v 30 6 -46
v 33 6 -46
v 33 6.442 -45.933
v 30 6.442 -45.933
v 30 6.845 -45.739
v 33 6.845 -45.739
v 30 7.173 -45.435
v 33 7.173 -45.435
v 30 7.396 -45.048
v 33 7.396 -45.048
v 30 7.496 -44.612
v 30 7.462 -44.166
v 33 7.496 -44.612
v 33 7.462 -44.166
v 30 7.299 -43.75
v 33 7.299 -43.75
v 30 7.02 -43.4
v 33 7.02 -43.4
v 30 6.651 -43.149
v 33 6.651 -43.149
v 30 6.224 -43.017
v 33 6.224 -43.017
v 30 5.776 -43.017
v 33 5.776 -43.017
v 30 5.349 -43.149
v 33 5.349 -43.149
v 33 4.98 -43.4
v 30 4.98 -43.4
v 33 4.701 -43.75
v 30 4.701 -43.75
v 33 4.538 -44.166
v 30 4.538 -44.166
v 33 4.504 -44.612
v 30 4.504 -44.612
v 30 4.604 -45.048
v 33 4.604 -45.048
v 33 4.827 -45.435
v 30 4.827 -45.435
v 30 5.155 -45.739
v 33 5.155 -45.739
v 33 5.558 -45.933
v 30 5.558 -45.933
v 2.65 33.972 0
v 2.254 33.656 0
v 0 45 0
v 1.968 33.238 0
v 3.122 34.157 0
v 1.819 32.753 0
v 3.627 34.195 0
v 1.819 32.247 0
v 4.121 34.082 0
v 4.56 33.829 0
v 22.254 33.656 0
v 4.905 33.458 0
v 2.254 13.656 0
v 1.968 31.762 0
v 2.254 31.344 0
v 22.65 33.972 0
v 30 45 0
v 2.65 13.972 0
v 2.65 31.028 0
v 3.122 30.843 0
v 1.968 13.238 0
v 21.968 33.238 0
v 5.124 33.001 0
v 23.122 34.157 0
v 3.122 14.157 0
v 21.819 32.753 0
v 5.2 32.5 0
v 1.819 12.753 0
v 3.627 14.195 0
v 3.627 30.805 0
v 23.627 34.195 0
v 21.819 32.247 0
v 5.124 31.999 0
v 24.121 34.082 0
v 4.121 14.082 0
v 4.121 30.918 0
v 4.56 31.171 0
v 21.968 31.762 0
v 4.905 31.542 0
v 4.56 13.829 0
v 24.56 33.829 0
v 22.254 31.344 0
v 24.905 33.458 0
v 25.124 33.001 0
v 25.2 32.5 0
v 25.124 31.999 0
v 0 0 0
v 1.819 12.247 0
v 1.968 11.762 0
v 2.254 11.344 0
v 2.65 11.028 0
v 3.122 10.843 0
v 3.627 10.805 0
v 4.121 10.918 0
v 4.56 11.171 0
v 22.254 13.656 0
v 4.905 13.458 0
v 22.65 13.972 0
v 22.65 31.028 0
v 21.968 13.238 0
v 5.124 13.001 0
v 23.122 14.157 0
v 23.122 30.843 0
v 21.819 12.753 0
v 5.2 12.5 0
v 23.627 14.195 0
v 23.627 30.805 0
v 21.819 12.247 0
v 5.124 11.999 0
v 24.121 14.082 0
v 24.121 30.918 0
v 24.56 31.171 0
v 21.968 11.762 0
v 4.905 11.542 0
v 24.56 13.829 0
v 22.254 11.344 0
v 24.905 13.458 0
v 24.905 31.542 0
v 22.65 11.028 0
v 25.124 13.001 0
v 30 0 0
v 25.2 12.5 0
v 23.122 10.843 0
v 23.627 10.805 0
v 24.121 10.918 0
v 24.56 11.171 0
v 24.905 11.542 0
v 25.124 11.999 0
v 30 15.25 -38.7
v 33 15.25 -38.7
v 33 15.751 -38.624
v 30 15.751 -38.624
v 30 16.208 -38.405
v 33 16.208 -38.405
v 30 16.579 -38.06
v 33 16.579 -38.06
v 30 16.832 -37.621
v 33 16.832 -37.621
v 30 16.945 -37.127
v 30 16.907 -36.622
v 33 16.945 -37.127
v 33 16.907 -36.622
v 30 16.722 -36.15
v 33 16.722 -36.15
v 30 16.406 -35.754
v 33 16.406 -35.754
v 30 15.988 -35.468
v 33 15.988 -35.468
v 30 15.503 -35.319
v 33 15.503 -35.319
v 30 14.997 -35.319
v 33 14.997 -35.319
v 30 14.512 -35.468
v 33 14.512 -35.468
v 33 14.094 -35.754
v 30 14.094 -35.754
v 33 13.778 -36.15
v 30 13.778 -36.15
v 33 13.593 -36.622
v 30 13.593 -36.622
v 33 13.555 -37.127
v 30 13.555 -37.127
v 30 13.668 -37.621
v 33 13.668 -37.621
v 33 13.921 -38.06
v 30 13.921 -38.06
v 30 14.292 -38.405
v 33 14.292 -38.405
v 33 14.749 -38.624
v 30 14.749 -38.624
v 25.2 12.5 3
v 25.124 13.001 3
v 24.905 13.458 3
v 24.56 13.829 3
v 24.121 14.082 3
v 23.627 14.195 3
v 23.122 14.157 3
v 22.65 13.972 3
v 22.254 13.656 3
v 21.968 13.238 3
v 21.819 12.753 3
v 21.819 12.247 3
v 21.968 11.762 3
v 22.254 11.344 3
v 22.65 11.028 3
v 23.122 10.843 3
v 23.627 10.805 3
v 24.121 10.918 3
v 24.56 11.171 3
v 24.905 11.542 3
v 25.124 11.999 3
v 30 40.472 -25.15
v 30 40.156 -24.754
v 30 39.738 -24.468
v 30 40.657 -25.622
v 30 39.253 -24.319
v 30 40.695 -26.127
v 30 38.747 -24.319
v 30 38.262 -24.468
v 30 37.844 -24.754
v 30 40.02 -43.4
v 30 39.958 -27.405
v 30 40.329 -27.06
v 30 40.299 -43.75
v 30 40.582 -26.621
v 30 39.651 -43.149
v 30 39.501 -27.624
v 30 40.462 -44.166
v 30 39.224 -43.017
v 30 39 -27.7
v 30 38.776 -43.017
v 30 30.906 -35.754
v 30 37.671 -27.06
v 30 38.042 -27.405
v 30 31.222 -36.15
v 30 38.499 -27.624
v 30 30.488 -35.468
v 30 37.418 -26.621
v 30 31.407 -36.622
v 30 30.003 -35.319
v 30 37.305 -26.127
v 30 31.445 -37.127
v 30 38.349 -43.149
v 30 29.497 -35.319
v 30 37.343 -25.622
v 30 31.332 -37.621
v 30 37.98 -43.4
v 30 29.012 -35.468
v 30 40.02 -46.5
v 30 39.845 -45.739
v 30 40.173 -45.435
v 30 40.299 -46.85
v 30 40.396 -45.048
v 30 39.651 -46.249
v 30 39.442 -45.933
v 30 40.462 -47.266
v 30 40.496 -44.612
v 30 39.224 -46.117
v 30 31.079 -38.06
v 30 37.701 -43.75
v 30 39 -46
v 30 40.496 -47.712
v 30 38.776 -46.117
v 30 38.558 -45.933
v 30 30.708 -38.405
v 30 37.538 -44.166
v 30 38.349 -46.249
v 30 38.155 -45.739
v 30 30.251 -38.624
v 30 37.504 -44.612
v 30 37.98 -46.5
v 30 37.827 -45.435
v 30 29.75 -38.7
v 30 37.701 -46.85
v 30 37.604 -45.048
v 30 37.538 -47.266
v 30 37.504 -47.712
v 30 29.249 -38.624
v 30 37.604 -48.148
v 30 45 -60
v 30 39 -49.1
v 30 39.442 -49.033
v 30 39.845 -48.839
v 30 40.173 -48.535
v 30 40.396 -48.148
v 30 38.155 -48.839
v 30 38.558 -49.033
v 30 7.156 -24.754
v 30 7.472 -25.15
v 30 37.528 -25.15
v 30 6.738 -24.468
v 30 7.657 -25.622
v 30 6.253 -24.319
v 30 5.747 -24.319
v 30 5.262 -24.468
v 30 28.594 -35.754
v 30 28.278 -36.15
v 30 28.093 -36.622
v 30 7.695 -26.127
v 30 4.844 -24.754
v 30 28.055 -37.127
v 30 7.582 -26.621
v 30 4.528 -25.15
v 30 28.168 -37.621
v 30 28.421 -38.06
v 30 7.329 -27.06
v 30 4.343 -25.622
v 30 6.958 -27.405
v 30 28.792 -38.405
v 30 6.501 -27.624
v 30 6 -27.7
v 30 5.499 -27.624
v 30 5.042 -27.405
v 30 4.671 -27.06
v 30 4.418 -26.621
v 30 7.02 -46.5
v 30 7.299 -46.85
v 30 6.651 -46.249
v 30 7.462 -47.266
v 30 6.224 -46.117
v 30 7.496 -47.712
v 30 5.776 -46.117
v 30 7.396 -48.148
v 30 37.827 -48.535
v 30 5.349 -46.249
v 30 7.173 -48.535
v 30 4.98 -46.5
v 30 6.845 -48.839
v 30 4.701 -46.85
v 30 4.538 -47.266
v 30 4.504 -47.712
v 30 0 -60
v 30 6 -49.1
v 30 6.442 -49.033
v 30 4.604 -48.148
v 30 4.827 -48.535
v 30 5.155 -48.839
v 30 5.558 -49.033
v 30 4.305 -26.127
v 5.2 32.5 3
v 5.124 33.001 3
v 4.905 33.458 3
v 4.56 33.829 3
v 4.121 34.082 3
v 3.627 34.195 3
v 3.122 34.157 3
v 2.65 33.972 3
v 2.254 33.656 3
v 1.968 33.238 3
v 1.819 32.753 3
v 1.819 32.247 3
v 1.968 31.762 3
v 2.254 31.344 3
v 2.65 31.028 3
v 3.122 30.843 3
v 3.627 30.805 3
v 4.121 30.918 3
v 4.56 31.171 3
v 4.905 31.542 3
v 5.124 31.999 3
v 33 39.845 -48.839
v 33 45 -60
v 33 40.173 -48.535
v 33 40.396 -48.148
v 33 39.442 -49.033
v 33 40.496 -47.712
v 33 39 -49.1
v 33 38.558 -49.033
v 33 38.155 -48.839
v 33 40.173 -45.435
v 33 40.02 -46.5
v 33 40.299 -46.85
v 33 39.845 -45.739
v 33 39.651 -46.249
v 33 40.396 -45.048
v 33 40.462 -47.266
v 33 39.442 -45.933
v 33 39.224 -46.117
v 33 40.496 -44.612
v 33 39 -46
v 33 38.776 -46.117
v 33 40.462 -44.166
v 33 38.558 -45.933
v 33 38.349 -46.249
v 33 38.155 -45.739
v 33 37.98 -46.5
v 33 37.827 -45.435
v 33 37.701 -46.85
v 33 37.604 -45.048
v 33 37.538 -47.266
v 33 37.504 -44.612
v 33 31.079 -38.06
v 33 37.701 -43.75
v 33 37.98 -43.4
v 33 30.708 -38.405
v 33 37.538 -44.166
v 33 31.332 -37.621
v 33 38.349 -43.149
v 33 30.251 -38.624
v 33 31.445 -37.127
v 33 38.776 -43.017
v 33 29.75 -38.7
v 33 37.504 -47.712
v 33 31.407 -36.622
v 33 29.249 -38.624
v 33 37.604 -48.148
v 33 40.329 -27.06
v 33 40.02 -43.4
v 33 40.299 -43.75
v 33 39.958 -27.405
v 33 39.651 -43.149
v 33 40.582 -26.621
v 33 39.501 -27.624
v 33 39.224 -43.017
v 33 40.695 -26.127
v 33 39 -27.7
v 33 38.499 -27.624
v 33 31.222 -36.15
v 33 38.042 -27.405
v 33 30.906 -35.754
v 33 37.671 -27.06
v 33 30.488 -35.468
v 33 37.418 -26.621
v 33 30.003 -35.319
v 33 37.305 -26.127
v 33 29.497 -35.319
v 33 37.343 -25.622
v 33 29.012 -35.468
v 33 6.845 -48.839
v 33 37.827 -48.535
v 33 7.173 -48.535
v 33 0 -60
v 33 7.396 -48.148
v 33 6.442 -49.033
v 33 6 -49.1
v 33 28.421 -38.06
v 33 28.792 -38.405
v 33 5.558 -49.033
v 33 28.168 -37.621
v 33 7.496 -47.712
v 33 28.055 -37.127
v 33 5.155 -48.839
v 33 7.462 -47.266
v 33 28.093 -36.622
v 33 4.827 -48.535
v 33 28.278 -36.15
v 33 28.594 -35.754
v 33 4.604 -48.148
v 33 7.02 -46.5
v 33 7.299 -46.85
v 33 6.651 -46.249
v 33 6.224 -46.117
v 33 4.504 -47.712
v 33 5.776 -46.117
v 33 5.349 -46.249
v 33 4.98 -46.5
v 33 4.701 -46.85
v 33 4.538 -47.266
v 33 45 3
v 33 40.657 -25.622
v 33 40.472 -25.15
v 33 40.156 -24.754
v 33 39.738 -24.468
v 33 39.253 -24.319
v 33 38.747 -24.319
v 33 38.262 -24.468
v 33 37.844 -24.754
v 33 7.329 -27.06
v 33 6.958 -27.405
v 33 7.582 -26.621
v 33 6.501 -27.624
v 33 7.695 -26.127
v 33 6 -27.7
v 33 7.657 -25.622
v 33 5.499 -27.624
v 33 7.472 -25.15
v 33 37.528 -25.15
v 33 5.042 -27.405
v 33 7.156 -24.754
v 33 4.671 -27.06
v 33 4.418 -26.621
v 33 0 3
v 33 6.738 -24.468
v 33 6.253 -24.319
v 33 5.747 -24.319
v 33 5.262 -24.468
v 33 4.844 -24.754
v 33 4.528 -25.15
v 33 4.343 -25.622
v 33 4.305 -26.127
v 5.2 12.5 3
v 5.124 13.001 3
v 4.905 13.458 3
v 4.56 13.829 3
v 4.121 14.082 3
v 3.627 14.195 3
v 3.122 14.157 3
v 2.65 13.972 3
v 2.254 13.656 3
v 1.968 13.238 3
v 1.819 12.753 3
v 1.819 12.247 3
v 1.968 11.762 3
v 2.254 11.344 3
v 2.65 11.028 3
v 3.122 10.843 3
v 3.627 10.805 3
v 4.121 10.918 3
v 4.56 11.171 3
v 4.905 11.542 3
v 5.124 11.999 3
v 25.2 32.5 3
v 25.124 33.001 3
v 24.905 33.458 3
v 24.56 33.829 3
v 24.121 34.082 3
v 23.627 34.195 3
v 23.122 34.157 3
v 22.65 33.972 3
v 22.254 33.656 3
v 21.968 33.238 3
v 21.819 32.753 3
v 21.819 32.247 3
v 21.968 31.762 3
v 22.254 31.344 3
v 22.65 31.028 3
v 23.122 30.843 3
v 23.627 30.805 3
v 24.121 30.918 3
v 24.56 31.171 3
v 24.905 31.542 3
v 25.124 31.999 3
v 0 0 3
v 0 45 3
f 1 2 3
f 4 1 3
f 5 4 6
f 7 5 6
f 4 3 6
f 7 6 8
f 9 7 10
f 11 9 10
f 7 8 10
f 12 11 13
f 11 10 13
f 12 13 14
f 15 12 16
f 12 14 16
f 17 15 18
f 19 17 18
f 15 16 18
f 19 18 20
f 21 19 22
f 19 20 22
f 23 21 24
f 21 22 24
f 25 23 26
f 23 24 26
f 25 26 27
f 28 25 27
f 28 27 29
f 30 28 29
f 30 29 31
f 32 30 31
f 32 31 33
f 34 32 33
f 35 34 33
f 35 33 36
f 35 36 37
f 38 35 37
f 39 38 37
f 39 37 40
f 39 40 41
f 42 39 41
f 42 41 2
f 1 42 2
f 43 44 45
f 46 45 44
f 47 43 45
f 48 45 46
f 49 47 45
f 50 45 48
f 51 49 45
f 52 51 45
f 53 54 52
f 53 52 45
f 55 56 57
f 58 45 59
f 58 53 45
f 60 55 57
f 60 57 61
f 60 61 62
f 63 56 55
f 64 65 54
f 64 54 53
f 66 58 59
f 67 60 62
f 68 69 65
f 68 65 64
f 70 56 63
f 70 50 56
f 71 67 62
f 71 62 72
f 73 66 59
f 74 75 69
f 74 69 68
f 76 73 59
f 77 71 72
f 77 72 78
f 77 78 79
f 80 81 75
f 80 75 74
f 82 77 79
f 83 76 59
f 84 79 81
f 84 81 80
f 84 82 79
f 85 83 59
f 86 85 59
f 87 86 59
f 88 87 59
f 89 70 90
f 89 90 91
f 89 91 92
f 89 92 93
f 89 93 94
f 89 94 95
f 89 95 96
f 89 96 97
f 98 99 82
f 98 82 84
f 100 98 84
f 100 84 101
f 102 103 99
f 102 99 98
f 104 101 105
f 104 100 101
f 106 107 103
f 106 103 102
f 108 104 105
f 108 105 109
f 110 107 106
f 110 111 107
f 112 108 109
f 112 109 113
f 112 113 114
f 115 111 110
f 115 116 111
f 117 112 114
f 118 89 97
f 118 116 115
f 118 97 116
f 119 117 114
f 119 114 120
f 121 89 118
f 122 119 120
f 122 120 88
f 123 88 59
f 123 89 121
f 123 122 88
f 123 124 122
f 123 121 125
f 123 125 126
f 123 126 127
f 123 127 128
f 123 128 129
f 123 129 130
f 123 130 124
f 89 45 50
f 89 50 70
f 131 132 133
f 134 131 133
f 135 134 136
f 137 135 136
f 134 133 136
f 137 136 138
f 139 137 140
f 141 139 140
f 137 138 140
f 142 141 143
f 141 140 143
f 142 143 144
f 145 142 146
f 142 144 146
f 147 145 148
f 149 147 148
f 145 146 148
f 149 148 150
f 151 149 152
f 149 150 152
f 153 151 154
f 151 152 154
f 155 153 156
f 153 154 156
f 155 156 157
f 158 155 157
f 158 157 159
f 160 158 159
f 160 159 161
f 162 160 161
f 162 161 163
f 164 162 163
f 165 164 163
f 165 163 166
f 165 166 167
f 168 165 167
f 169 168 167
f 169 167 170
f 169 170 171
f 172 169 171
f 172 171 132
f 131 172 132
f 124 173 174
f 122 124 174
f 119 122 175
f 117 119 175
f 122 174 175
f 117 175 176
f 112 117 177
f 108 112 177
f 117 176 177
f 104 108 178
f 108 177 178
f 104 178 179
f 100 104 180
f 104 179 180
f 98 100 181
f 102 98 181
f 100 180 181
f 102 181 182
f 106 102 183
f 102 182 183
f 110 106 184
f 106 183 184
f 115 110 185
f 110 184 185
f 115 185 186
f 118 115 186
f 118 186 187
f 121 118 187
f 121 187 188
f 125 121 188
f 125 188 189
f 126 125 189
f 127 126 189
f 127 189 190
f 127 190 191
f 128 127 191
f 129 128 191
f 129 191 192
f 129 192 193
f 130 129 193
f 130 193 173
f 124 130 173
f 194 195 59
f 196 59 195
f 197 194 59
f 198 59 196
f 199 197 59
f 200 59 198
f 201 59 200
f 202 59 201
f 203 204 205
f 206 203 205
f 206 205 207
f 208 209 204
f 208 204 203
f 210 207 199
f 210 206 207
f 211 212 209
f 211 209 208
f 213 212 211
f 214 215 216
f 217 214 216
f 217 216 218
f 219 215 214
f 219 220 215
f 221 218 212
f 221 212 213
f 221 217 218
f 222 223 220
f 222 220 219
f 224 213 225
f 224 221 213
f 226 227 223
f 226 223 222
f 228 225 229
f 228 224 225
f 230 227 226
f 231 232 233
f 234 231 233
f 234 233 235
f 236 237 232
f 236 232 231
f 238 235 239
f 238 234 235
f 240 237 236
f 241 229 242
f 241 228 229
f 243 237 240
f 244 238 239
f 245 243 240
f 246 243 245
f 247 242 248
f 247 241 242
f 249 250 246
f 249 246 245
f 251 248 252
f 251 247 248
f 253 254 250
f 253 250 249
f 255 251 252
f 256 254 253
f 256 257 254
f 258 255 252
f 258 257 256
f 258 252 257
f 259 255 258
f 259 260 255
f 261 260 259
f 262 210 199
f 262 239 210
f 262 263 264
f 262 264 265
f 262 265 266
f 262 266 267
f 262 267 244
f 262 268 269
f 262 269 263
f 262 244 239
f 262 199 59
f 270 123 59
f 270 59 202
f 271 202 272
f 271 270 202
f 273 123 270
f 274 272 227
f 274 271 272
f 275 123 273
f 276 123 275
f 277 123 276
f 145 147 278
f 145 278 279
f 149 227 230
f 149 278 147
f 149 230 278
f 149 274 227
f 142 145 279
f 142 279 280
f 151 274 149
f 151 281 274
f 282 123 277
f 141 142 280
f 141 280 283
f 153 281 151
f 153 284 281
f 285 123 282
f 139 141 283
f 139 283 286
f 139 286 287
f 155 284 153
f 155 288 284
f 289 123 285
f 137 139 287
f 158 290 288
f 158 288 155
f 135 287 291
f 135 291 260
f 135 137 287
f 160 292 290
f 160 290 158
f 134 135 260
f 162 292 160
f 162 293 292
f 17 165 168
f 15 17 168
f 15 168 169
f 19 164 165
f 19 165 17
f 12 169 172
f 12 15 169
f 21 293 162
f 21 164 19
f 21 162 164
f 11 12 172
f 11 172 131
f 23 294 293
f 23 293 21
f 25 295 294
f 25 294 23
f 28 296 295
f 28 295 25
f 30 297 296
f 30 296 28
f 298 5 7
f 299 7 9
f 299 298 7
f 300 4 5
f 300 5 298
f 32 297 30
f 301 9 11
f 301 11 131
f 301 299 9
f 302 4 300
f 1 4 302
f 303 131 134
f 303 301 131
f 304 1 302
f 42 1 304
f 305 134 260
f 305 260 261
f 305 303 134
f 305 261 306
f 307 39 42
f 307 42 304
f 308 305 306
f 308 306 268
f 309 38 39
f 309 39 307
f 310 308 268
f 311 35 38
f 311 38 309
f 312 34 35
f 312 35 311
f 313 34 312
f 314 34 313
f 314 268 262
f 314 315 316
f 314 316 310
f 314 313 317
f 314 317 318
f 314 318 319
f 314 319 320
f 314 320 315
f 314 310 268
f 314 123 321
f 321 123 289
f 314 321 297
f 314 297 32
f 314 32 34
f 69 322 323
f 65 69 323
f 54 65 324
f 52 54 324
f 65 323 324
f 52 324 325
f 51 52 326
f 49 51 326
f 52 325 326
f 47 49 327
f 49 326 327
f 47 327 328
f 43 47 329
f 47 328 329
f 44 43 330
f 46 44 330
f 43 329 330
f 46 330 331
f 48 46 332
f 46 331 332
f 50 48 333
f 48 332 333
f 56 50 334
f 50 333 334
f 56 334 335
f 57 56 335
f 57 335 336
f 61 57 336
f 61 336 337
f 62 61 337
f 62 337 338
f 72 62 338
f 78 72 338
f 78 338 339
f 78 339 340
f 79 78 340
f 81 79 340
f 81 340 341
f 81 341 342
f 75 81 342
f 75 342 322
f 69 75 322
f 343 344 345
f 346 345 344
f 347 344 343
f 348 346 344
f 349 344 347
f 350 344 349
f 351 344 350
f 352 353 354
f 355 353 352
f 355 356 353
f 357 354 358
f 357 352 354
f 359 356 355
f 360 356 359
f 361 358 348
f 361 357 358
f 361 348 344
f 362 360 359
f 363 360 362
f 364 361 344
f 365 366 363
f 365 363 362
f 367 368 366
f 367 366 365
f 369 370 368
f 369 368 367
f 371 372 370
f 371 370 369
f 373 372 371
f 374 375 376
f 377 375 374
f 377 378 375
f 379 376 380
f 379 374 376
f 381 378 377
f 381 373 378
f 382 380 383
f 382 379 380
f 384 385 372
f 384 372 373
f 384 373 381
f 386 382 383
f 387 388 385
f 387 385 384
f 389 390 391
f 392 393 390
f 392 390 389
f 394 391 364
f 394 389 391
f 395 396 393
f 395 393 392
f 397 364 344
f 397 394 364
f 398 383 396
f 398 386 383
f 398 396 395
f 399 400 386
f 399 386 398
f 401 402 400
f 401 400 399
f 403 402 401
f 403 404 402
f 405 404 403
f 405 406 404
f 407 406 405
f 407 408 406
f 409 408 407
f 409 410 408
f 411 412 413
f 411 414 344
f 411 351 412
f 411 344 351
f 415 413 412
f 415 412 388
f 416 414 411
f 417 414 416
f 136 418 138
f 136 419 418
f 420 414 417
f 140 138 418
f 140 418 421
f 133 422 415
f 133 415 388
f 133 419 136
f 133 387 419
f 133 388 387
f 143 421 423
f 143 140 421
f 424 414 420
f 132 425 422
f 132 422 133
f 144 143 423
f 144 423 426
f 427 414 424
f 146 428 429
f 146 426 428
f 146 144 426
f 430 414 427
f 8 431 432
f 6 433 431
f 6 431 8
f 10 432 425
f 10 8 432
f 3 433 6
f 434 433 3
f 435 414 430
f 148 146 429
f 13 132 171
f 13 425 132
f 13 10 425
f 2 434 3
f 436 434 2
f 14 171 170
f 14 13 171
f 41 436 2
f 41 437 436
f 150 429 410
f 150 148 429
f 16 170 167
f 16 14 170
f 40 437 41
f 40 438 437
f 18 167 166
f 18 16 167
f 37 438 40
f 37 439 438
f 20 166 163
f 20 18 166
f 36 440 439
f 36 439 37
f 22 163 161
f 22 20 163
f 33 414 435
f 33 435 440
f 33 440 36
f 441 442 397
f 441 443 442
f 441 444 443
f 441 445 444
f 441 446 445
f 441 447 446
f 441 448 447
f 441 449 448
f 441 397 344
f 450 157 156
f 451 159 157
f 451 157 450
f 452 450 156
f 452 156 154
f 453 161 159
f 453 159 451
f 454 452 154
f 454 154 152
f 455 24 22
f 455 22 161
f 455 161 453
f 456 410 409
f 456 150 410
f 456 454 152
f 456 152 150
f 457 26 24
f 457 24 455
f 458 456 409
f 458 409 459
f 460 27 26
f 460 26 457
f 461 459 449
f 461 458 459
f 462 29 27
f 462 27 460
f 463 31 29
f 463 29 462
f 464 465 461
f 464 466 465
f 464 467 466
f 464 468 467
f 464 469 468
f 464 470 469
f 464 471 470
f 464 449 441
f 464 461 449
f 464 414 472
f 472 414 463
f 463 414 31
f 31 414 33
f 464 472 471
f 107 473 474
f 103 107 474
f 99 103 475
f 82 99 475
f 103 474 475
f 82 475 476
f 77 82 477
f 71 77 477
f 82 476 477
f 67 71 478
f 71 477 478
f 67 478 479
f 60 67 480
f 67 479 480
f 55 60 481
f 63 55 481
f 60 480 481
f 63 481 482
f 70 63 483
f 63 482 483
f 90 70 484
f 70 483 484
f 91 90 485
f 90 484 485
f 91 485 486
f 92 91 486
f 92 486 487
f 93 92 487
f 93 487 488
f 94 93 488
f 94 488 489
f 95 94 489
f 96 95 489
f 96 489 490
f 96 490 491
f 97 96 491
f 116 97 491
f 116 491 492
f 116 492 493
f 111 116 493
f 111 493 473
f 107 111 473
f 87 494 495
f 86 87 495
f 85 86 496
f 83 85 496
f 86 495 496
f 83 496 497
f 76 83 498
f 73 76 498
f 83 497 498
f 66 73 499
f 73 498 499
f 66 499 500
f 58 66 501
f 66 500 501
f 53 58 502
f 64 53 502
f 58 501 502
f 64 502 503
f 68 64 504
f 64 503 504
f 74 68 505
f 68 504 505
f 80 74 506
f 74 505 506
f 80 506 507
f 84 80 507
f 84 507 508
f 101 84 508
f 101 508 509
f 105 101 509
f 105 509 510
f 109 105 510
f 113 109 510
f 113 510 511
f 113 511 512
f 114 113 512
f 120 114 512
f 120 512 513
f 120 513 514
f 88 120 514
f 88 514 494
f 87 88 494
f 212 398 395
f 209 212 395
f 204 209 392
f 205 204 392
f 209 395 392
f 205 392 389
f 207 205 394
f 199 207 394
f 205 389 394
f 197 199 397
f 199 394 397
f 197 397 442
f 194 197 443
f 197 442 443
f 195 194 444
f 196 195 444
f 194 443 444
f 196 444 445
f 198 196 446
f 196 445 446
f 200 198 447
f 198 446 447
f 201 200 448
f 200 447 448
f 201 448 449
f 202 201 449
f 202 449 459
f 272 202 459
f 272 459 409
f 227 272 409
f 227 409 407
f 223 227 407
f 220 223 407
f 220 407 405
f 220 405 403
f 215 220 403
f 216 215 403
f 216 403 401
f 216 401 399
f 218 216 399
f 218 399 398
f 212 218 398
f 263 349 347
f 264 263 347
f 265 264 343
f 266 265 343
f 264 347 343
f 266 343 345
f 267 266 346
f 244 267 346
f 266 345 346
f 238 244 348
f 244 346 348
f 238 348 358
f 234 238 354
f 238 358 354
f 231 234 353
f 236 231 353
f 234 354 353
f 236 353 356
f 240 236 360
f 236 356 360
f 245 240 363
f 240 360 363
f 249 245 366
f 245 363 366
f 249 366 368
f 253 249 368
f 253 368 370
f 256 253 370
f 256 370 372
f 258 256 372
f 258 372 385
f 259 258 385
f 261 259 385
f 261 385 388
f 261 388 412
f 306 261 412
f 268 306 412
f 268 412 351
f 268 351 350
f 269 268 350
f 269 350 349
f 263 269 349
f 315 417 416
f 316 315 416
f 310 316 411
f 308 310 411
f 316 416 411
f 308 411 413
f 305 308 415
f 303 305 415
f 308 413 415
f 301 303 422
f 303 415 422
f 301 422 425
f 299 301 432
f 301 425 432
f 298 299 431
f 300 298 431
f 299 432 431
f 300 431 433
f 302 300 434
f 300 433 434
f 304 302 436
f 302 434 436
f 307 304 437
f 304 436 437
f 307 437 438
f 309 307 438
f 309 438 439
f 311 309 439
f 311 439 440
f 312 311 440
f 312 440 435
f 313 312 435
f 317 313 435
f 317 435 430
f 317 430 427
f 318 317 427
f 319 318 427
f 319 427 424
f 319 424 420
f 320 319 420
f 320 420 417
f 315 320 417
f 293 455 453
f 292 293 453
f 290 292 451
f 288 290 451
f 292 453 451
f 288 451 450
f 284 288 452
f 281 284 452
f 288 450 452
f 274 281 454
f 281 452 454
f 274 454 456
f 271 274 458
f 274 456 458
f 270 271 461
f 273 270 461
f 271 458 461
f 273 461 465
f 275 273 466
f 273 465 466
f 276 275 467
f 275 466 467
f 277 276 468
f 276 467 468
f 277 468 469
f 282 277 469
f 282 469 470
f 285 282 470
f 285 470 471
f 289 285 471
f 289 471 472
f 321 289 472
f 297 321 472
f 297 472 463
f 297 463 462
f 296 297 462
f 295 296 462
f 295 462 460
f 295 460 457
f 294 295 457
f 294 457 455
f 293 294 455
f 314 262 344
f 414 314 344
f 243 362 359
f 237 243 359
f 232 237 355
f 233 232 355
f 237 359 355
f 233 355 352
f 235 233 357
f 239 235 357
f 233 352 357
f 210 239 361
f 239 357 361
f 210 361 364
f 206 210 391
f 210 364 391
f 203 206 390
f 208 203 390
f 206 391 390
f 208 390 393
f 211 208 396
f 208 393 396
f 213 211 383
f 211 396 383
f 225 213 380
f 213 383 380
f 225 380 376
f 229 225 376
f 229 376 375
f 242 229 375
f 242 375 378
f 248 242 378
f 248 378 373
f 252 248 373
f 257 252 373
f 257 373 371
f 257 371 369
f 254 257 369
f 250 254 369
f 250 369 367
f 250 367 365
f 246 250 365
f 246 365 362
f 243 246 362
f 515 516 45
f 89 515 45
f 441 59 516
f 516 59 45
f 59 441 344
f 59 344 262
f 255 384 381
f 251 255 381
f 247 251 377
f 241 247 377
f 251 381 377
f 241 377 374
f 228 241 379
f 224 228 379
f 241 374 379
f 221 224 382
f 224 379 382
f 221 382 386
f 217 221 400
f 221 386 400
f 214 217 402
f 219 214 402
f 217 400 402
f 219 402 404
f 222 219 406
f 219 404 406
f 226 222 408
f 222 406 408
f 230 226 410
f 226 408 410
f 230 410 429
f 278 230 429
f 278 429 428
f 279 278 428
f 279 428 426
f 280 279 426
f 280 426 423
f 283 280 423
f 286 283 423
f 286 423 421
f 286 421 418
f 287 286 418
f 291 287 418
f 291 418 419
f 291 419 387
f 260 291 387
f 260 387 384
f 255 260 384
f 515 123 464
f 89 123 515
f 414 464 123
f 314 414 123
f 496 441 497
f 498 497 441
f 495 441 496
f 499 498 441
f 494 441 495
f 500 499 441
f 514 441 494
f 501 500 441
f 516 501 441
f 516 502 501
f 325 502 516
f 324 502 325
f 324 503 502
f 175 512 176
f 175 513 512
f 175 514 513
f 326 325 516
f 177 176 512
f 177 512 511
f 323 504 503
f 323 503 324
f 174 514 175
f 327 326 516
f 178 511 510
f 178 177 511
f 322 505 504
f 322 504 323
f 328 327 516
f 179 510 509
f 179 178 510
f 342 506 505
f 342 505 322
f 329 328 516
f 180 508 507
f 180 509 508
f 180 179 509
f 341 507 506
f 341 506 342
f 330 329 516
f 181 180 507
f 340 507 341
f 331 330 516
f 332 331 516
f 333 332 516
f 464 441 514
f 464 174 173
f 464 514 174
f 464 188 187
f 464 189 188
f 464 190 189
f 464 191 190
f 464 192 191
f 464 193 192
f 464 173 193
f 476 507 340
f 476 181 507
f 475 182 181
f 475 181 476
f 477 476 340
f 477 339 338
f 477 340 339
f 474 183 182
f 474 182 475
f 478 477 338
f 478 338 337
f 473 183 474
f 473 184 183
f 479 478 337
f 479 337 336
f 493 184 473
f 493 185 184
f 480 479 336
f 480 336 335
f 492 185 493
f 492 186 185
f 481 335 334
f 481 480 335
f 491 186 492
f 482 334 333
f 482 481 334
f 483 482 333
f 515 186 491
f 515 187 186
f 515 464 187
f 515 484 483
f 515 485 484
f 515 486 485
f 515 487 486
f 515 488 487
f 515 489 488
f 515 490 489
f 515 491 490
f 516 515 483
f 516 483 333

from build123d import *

# Parameters (mm, degrees)
EXTRUDE_1_DEPTH     = 45
CUT_EXTRUDE_1_REACH = 86.161
SKETCH_2_R          = 1.7
CUT_EXTRUDE_2_REACH = 83.939
SKETCH_3_R          = 1.7
SKETCH_3_R_2        = 1.5


with BuildPart() as part:
    # 草图1 → 凸台-拉伸1 (new body)
    with BuildSketch(Plane(origin=(0, 0, 0), x_dir=(1, 0, 0), z_dir=(0, 1, 0))):
        Polygon((0, 0), (30, 0), (30, 60), (33, 60), (33, -3), (0, -3), align=None)
    extrude(amount=EXTRUDE_1_DEPTH)

    # 草图2 → 切除-拉伸1 (cut, up to next)
    with BuildSketch(Plane.XY.offset(3), mode=Mode.PRIVATE) as cut_extrude_1_sk1:
        with Locations((3.5, 32.5)):
            Circle(SKETCH_2_R)
    cut_extrude_1_tool1 = extrude(cut_extrude_1_sk1.sketch, amount=-CUT_EXTRUDE_1_REACH, mode=Mode.PRIVATE) & part.part
    # 草图2 → 切除-拉伸1 (cut, up to next)
    with BuildSketch(Plane.XY.offset(3), mode=Mode.PRIVATE) as cut_extrude_1_sk2:
        with Locations((23.5, 32.5)):
            Circle(SKETCH_2_R)
    cut_extrude_1_tool2 = extrude(cut_extrude_1_sk2.sketch, amount=-CUT_EXTRUDE_1_REACH, mode=Mode.PRIVATE) & part.part
    # 草图2 → 切除-拉伸1 (cut, up to next)
    with BuildSketch(Plane.XY.offset(3), mode=Mode.PRIVATE) as cut_extrude_1_sk3:
        with Locations((23.5, 12.5)):
            Circle(SKETCH_2_R)
    cut_extrude_1_tool3 = extrude(cut_extrude_1_sk3.sketch, amount=-CUT_EXTRUDE_1_REACH, mode=Mode.PRIVATE) & part.part
    # 草图2 → 切除-拉伸1 (cut, up to next)
    with BuildSketch(Plane.XY.offset(3), mode=Mode.PRIVATE) as cut_extrude_1_sk4:
        with Locations((3.5, 12.5)):
            Circle(SKETCH_2_R)
    cut_extrude_1_tool4 = extrude(cut_extrude_1_sk4.sketch, amount=-CUT_EXTRUDE_1_REACH, mode=Mode.PRIVATE) & part.part
    add(cut_extrude_1_tool1.solids().sort_by_distance((3.5, 32.5, 3))[0], mode=Mode.SUBTRACT)
    add(cut_extrude_1_tool2.solids().sort_by_distance((23.5, 32.5, 3))[0], mode=Mode.SUBTRACT)
    add(cut_extrude_1_tool3.solids().sort_by_distance((23.5, 12.5, 3))[0], mode=Mode.SUBTRACT)
    add(cut_extrude_1_tool4.solids().sort_by_distance((3.5, 12.5, 3))[0], mode=Mode.SUBTRACT)

    # 草图3 → 切除-拉伸2 (cut, up to next)
    with BuildSketch(Plane(origin=(33, 0, 0), x_dir=(0, 0, -1), z_dir=(1, 0, 0)), mode=Mode.PRIVATE) as cut_extrude_2_sk1:
        with Locations((26, 6)):
            Circle(SKETCH_3_R)
    cut_extrude_2_tool1 = extrude(cut_extrude_2_sk1.sketch, amount=-CUT_EXTRUDE_2_REACH, mode=Mode.PRIVATE) & part.part
    # 草图3 → 切除-拉伸2 (cut, up to next)
    with BuildSketch(Plane(origin=(33, 0, 0), x_dir=(0, 0, -1), z_dir=(1, 0, 0)), mode=Mode.PRIVATE) as cut_extrude_2_sk2:
        with Locations((26, 39)):
            Circle(SKETCH_3_R)
    cut_extrude_2_tool2 = extrude(cut_extrude_2_sk2.sketch, amount=-CUT_EXTRUDE_2_REACH, mode=Mode.PRIVATE) & part.part
    # 草图3 → 切除-拉伸2 (cut, up to next)
    with BuildSketch(Plane(origin=(33, 0, 0), x_dir=(0, 0, -1), z_dir=(1, 0, 0)), mode=Mode.PRIVATE) as cut_extrude_2_sk3:
        with Locations((37, 15.25)):
            Circle(SKETCH_3_R)
    cut_extrude_2_tool3 = extrude(cut_extrude_2_sk3.sketch, amount=-CUT_EXTRUDE_2_REACH, mode=Mode.PRIVATE) & part.part
    # 草图3 → 切除-拉伸2 (cut, up to next)
    with BuildSketch(Plane(origin=(33, 0, 0), x_dir=(0, 0, -1), z_dir=(1, 0, 0)), mode=Mode.PRIVATE) as cut_extrude_2_sk4:
        with Locations((37, 29.75)):
            Circle(SKETCH_3_R)
    cut_extrude_2_tool4 = extrude(cut_extrude_2_sk4.sketch, amount=-CUT_EXTRUDE_2_REACH, mode=Mode.PRIVATE) & part.part
    # 草图3 → 切除-拉伸2 (cut, up to next)
    with BuildSketch(Plane(origin=(33, 0, 0), x_dir=(0, 0, -1), z_dir=(1, 0, 0)), mode=Mode.PRIVATE) as cut_extrude_2_sk5:
        with Locations((44.5, 39)):
            Circle(SKETCH_3_R_2)
    cut_extrude_2_tool5 = extrude(cut_extrude_2_sk5.sketch, amount=-CUT_EXTRUDE_2_REACH, mode=Mode.PRIVATE) & part.part
    # 草图3 → 切除-拉伸2 (cut, up to next)
    with BuildSketch(Plane(origin=(33, 0, 0), x_dir=(0, 0, -1), z_dir=(1, 0, 0)), mode=Mode.PRIVATE) as cut_extrude_2_sk6:
        with Locations((47.6, 6)):
            Circle(SKETCH_3_R_2)
    cut_extrude_2_tool6 = extrude(cut_extrude_2_sk6.sketch, amount=-CUT_EXTRUDE_2_REACH, mode=Mode.PRIVATE) & part.part
    # 草图3 → 切除-拉伸2 (cut, up to next)
    with BuildSketch(Plane(origin=(33, 0, 0), x_dir=(0, 0, -1), z_dir=(1, 0, 0)), mode=Mode.PRIVATE) as cut_extrude_2_sk7:
        with Locations((47.6, 39)):
            Circle(SKETCH_3_R_2)
    cut_extrude_2_tool7 = extrude(cut_extrude_2_sk7.sketch, amount=-CUT_EXTRUDE_2_REACH, mode=Mode.PRIVATE) & part.part
    # 草图3 → 切除-拉伸2 (cut, up to next)
    with BuildSketch(Plane(origin=(33, 0, 0), x_dir=(0, 0, -1), z_dir=(1, 0, 0)), mode=Mode.PRIVATE) as cut_extrude_2_sk8:
        with Locations((44.5, 6)):
            Circle(SKETCH_3_R_2)
    cut_extrude_2_tool8 = extrude(cut_extrude_2_sk8.sketch, amount=-CUT_EXTRUDE_2_REACH, mode=Mode.PRIVATE) & part.part
    add(cut_extrude_2_tool1.solids().sort_by_distance((33, 6, -26))[0], mode=Mode.SUBTRACT)
    add(cut_extrude_2_tool2.solids().sort_by_distance((33, 39, -26))[0], mode=Mode.SUBTRACT)
    add(cut_extrude_2_tool3.solids().sort_by_distance((33, 15.25, -37))[0], mode=Mode.SUBTRACT)
    add(cut_extrude_2_tool4.solids().sort_by_distance((33, 29.75, -37))[0], mode=Mode.SUBTRACT)
    add(cut_extrude_2_tool5.solids().sort_by_distance((33, 39, -44.5))[0], mode=Mode.SUBTRACT)
    add(cut_extrude_2_tool6.solids().sort_by_distance((33, 6, -47.6))[0], mode=Mode.SUBTRACT)
    add(cut_extrude_2_tool7.solids().sort_by_distance((33, 39, -47.6))[0], mode=Mode.SUBTRACT)
    add(cut_extrude_2_tool8.solids().sort_by_distance((33, 6, -44.5))[0], mode=Mode.SUBTRACT)


solid = part.part
